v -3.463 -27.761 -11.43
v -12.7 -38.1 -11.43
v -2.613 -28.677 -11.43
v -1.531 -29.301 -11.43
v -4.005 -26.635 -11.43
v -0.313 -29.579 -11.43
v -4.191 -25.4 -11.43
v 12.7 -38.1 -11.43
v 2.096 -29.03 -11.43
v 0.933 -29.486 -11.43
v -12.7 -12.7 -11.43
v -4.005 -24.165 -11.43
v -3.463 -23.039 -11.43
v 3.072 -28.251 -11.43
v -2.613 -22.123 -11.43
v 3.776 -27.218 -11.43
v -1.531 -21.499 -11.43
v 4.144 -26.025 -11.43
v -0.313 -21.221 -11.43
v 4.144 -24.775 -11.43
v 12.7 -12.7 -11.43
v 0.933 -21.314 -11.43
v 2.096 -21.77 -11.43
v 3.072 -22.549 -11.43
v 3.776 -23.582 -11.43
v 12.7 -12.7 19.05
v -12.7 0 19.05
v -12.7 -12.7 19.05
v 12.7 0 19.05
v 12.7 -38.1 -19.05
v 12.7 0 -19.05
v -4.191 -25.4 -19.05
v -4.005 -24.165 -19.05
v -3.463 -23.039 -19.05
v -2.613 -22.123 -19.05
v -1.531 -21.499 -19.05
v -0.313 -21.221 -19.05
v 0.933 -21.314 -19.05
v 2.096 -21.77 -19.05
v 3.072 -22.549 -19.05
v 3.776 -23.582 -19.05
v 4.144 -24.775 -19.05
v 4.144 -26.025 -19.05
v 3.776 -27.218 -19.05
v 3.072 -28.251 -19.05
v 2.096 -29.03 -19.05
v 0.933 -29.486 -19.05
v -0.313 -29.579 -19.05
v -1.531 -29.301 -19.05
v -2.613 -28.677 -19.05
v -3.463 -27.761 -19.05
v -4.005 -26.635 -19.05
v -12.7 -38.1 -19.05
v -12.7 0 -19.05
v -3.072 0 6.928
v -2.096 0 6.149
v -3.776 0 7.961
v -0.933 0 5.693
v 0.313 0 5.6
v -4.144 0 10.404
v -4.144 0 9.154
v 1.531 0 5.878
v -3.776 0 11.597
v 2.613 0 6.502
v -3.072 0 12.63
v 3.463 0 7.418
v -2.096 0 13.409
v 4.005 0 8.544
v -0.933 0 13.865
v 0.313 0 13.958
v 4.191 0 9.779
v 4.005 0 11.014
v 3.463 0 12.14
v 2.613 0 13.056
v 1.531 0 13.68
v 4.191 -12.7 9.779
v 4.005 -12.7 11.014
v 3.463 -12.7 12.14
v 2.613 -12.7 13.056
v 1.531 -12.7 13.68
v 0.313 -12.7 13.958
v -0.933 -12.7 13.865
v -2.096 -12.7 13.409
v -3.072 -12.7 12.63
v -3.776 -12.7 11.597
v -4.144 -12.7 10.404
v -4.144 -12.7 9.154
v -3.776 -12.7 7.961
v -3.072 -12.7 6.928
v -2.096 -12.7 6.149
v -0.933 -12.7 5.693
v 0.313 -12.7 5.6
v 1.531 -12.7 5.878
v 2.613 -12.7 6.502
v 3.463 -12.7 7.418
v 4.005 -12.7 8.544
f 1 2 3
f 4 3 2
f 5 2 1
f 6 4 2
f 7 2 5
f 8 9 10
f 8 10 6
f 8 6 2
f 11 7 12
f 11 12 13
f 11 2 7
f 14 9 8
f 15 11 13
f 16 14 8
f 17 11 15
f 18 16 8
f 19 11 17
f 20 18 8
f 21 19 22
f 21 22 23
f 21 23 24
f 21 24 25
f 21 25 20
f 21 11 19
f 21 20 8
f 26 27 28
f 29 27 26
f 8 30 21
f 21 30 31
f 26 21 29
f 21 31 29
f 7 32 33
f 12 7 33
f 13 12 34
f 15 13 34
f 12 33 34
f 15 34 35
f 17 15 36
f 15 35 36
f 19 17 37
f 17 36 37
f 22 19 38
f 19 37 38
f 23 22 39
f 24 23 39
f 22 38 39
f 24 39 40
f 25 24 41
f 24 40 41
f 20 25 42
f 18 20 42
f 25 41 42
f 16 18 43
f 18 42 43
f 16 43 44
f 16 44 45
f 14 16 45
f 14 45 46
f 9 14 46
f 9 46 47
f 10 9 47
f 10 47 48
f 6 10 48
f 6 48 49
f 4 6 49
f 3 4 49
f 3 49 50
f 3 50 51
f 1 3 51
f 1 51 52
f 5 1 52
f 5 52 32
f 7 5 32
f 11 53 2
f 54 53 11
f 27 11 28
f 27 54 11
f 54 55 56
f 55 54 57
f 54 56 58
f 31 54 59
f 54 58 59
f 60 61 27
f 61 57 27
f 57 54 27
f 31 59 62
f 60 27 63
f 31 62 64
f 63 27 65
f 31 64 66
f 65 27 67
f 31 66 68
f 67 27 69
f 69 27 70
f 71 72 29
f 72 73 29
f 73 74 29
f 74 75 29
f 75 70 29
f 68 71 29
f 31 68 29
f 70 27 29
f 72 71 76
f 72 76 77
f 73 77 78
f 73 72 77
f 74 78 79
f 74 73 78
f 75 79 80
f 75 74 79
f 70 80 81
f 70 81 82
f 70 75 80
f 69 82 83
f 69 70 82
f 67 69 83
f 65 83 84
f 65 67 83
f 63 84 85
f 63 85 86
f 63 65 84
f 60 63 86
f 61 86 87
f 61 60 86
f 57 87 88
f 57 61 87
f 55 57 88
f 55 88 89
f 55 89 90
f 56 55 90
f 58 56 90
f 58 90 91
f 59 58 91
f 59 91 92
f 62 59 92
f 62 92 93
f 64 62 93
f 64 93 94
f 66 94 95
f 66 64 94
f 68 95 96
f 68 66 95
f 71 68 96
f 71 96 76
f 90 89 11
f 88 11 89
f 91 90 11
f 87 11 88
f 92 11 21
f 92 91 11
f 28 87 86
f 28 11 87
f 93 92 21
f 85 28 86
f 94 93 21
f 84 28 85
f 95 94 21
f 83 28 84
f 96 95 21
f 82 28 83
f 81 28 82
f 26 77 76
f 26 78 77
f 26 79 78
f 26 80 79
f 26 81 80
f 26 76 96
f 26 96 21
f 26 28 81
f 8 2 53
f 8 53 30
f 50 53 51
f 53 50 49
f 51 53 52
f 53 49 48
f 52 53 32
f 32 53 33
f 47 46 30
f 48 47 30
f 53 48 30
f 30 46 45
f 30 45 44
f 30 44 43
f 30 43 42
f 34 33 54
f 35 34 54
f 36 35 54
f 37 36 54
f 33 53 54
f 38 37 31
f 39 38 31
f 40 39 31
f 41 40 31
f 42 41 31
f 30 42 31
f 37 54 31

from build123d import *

# Parameters (mm, degrees)
F0_W     = 25.4
F0_H     = 30.48
F0_R     = 4.191
F1_DEPTH = 12.7
F0_H_2   = 7.62
F2_DEPTH = 38.1
F4_D     = 8.382
F4_DEPTH = 12.7


with BuildPart() as f1:
    # F0 (on Front) → F1 (new body)
    with BuildSketch(Plane.XZ):
        with Locations((0, 3.81)):
            Rectangle(F0_W, F0_H)
        with Locations((0, 9.779)):
            Circle(F0_R, mode=Mode.SUBTRACT)
    extrude(amount=F1_DEPTH)

    # F0 (on Front) → F2 (join)
    with BuildSketch(Plane.XZ):
        with Locations((0, -15.24)):
            Rectangle(F0_W, F0_H_2)
    extrude(amount=F2_DEPTH)

    # F4
    with Locations(Plane.XY.offset(-11.43)):
        with Locations((0, -25.4)):
            Hole(F4_D / 2, depth=F4_DEPTH)


solid = f1.part
